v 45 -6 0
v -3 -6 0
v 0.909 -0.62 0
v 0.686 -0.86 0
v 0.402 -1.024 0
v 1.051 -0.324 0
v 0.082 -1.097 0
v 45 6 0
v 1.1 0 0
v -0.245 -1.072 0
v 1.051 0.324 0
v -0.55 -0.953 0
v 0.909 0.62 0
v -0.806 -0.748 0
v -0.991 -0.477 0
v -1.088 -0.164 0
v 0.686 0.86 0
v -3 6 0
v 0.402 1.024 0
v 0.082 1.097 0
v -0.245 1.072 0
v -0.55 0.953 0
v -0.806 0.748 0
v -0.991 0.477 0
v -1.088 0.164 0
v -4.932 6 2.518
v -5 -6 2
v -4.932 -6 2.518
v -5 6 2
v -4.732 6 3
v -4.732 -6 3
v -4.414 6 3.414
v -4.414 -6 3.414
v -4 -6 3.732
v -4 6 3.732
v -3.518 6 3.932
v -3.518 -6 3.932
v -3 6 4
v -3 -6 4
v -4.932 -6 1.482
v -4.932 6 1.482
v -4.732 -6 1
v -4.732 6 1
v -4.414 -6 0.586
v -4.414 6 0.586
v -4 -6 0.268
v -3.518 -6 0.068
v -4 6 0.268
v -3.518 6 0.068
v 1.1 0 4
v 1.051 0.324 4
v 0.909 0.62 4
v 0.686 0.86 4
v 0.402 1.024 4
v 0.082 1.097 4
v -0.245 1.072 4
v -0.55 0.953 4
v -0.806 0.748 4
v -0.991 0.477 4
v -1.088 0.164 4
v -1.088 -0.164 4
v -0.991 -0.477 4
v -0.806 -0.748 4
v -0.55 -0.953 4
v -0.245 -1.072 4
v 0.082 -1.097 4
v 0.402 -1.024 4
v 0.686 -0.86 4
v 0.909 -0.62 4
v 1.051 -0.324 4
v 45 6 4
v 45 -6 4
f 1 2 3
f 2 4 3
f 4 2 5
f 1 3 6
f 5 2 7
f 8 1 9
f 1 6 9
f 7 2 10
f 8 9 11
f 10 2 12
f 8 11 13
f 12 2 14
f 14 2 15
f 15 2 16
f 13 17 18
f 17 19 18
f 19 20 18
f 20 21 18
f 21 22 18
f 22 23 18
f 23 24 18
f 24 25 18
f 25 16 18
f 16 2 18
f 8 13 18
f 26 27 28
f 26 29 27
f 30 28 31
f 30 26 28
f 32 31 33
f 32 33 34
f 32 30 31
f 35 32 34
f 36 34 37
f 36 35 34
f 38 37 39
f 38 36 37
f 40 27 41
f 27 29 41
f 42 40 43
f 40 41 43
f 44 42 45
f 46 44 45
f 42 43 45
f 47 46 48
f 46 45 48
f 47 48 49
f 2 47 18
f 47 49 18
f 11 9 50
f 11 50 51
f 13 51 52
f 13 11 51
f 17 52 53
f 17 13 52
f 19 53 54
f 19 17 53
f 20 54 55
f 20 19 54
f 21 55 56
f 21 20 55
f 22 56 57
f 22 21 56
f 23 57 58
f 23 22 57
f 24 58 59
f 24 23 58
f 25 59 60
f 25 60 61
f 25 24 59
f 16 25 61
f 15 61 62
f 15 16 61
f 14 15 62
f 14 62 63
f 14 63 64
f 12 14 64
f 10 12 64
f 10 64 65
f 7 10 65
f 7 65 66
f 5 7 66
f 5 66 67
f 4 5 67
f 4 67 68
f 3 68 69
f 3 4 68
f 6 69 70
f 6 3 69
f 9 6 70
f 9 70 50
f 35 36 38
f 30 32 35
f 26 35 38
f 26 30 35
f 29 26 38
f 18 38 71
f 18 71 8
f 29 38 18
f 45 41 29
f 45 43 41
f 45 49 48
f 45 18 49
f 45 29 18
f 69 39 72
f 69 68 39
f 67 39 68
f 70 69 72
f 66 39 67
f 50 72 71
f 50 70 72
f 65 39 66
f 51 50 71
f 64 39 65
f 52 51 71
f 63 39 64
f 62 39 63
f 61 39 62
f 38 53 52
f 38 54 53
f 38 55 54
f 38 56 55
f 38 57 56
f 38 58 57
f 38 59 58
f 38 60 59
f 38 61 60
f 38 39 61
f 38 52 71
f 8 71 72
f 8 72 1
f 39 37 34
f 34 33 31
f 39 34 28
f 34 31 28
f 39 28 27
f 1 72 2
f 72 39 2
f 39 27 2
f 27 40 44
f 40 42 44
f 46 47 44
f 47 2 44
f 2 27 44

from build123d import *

# Parameters (mm, degrees)
SKETCH1_W           = 10
SKETCH1_H           = 12
SKETCH1_R           = 1.1
BOSS_EXTRUDE1_DEPTH = 4
FILLET1_R           = 2
SKETCH2_W           = 4
SKETCH2_H           = 12
BOSS_EXTRUDE2_DEPTH = 40


with BuildPart() as part:
    # Sketch1 → Boss-Extrude1 (new body)
    with BuildSketch(Plane.XY):
        Rectangle(SKETCH1_W, SKETCH1_H)
        Circle(SKETCH1_R, mode=Mode.SUBTRACT)
    extrude(amount=BOSS_EXTRUDE1_DEPTH)

    # Fillet1
    fillet1_edges = [part.edges().sort_by_distance(p)[0] for p in [
        (-5, 0, 4),
        (-5, 0, 0),
    ]]
    fillet(fillet1_edges, radius=FILLET1_R - 0.0001)  # a hair under: the kernel refuses the full size

    # Sketch2 → Boss-Extrude2 (add)
    with BuildSketch(Plane(origin=(5, 0, 0), x_dir=(0, 0, -1), z_dir=(1, 0, 0))):
        with Locations((-2, 0)):
            Rectangle(SKETCH2_W, SKETCH2_H)
    extrude(amount=BOSS_EXTRUDE2_DEPTH)


solid = part.part
